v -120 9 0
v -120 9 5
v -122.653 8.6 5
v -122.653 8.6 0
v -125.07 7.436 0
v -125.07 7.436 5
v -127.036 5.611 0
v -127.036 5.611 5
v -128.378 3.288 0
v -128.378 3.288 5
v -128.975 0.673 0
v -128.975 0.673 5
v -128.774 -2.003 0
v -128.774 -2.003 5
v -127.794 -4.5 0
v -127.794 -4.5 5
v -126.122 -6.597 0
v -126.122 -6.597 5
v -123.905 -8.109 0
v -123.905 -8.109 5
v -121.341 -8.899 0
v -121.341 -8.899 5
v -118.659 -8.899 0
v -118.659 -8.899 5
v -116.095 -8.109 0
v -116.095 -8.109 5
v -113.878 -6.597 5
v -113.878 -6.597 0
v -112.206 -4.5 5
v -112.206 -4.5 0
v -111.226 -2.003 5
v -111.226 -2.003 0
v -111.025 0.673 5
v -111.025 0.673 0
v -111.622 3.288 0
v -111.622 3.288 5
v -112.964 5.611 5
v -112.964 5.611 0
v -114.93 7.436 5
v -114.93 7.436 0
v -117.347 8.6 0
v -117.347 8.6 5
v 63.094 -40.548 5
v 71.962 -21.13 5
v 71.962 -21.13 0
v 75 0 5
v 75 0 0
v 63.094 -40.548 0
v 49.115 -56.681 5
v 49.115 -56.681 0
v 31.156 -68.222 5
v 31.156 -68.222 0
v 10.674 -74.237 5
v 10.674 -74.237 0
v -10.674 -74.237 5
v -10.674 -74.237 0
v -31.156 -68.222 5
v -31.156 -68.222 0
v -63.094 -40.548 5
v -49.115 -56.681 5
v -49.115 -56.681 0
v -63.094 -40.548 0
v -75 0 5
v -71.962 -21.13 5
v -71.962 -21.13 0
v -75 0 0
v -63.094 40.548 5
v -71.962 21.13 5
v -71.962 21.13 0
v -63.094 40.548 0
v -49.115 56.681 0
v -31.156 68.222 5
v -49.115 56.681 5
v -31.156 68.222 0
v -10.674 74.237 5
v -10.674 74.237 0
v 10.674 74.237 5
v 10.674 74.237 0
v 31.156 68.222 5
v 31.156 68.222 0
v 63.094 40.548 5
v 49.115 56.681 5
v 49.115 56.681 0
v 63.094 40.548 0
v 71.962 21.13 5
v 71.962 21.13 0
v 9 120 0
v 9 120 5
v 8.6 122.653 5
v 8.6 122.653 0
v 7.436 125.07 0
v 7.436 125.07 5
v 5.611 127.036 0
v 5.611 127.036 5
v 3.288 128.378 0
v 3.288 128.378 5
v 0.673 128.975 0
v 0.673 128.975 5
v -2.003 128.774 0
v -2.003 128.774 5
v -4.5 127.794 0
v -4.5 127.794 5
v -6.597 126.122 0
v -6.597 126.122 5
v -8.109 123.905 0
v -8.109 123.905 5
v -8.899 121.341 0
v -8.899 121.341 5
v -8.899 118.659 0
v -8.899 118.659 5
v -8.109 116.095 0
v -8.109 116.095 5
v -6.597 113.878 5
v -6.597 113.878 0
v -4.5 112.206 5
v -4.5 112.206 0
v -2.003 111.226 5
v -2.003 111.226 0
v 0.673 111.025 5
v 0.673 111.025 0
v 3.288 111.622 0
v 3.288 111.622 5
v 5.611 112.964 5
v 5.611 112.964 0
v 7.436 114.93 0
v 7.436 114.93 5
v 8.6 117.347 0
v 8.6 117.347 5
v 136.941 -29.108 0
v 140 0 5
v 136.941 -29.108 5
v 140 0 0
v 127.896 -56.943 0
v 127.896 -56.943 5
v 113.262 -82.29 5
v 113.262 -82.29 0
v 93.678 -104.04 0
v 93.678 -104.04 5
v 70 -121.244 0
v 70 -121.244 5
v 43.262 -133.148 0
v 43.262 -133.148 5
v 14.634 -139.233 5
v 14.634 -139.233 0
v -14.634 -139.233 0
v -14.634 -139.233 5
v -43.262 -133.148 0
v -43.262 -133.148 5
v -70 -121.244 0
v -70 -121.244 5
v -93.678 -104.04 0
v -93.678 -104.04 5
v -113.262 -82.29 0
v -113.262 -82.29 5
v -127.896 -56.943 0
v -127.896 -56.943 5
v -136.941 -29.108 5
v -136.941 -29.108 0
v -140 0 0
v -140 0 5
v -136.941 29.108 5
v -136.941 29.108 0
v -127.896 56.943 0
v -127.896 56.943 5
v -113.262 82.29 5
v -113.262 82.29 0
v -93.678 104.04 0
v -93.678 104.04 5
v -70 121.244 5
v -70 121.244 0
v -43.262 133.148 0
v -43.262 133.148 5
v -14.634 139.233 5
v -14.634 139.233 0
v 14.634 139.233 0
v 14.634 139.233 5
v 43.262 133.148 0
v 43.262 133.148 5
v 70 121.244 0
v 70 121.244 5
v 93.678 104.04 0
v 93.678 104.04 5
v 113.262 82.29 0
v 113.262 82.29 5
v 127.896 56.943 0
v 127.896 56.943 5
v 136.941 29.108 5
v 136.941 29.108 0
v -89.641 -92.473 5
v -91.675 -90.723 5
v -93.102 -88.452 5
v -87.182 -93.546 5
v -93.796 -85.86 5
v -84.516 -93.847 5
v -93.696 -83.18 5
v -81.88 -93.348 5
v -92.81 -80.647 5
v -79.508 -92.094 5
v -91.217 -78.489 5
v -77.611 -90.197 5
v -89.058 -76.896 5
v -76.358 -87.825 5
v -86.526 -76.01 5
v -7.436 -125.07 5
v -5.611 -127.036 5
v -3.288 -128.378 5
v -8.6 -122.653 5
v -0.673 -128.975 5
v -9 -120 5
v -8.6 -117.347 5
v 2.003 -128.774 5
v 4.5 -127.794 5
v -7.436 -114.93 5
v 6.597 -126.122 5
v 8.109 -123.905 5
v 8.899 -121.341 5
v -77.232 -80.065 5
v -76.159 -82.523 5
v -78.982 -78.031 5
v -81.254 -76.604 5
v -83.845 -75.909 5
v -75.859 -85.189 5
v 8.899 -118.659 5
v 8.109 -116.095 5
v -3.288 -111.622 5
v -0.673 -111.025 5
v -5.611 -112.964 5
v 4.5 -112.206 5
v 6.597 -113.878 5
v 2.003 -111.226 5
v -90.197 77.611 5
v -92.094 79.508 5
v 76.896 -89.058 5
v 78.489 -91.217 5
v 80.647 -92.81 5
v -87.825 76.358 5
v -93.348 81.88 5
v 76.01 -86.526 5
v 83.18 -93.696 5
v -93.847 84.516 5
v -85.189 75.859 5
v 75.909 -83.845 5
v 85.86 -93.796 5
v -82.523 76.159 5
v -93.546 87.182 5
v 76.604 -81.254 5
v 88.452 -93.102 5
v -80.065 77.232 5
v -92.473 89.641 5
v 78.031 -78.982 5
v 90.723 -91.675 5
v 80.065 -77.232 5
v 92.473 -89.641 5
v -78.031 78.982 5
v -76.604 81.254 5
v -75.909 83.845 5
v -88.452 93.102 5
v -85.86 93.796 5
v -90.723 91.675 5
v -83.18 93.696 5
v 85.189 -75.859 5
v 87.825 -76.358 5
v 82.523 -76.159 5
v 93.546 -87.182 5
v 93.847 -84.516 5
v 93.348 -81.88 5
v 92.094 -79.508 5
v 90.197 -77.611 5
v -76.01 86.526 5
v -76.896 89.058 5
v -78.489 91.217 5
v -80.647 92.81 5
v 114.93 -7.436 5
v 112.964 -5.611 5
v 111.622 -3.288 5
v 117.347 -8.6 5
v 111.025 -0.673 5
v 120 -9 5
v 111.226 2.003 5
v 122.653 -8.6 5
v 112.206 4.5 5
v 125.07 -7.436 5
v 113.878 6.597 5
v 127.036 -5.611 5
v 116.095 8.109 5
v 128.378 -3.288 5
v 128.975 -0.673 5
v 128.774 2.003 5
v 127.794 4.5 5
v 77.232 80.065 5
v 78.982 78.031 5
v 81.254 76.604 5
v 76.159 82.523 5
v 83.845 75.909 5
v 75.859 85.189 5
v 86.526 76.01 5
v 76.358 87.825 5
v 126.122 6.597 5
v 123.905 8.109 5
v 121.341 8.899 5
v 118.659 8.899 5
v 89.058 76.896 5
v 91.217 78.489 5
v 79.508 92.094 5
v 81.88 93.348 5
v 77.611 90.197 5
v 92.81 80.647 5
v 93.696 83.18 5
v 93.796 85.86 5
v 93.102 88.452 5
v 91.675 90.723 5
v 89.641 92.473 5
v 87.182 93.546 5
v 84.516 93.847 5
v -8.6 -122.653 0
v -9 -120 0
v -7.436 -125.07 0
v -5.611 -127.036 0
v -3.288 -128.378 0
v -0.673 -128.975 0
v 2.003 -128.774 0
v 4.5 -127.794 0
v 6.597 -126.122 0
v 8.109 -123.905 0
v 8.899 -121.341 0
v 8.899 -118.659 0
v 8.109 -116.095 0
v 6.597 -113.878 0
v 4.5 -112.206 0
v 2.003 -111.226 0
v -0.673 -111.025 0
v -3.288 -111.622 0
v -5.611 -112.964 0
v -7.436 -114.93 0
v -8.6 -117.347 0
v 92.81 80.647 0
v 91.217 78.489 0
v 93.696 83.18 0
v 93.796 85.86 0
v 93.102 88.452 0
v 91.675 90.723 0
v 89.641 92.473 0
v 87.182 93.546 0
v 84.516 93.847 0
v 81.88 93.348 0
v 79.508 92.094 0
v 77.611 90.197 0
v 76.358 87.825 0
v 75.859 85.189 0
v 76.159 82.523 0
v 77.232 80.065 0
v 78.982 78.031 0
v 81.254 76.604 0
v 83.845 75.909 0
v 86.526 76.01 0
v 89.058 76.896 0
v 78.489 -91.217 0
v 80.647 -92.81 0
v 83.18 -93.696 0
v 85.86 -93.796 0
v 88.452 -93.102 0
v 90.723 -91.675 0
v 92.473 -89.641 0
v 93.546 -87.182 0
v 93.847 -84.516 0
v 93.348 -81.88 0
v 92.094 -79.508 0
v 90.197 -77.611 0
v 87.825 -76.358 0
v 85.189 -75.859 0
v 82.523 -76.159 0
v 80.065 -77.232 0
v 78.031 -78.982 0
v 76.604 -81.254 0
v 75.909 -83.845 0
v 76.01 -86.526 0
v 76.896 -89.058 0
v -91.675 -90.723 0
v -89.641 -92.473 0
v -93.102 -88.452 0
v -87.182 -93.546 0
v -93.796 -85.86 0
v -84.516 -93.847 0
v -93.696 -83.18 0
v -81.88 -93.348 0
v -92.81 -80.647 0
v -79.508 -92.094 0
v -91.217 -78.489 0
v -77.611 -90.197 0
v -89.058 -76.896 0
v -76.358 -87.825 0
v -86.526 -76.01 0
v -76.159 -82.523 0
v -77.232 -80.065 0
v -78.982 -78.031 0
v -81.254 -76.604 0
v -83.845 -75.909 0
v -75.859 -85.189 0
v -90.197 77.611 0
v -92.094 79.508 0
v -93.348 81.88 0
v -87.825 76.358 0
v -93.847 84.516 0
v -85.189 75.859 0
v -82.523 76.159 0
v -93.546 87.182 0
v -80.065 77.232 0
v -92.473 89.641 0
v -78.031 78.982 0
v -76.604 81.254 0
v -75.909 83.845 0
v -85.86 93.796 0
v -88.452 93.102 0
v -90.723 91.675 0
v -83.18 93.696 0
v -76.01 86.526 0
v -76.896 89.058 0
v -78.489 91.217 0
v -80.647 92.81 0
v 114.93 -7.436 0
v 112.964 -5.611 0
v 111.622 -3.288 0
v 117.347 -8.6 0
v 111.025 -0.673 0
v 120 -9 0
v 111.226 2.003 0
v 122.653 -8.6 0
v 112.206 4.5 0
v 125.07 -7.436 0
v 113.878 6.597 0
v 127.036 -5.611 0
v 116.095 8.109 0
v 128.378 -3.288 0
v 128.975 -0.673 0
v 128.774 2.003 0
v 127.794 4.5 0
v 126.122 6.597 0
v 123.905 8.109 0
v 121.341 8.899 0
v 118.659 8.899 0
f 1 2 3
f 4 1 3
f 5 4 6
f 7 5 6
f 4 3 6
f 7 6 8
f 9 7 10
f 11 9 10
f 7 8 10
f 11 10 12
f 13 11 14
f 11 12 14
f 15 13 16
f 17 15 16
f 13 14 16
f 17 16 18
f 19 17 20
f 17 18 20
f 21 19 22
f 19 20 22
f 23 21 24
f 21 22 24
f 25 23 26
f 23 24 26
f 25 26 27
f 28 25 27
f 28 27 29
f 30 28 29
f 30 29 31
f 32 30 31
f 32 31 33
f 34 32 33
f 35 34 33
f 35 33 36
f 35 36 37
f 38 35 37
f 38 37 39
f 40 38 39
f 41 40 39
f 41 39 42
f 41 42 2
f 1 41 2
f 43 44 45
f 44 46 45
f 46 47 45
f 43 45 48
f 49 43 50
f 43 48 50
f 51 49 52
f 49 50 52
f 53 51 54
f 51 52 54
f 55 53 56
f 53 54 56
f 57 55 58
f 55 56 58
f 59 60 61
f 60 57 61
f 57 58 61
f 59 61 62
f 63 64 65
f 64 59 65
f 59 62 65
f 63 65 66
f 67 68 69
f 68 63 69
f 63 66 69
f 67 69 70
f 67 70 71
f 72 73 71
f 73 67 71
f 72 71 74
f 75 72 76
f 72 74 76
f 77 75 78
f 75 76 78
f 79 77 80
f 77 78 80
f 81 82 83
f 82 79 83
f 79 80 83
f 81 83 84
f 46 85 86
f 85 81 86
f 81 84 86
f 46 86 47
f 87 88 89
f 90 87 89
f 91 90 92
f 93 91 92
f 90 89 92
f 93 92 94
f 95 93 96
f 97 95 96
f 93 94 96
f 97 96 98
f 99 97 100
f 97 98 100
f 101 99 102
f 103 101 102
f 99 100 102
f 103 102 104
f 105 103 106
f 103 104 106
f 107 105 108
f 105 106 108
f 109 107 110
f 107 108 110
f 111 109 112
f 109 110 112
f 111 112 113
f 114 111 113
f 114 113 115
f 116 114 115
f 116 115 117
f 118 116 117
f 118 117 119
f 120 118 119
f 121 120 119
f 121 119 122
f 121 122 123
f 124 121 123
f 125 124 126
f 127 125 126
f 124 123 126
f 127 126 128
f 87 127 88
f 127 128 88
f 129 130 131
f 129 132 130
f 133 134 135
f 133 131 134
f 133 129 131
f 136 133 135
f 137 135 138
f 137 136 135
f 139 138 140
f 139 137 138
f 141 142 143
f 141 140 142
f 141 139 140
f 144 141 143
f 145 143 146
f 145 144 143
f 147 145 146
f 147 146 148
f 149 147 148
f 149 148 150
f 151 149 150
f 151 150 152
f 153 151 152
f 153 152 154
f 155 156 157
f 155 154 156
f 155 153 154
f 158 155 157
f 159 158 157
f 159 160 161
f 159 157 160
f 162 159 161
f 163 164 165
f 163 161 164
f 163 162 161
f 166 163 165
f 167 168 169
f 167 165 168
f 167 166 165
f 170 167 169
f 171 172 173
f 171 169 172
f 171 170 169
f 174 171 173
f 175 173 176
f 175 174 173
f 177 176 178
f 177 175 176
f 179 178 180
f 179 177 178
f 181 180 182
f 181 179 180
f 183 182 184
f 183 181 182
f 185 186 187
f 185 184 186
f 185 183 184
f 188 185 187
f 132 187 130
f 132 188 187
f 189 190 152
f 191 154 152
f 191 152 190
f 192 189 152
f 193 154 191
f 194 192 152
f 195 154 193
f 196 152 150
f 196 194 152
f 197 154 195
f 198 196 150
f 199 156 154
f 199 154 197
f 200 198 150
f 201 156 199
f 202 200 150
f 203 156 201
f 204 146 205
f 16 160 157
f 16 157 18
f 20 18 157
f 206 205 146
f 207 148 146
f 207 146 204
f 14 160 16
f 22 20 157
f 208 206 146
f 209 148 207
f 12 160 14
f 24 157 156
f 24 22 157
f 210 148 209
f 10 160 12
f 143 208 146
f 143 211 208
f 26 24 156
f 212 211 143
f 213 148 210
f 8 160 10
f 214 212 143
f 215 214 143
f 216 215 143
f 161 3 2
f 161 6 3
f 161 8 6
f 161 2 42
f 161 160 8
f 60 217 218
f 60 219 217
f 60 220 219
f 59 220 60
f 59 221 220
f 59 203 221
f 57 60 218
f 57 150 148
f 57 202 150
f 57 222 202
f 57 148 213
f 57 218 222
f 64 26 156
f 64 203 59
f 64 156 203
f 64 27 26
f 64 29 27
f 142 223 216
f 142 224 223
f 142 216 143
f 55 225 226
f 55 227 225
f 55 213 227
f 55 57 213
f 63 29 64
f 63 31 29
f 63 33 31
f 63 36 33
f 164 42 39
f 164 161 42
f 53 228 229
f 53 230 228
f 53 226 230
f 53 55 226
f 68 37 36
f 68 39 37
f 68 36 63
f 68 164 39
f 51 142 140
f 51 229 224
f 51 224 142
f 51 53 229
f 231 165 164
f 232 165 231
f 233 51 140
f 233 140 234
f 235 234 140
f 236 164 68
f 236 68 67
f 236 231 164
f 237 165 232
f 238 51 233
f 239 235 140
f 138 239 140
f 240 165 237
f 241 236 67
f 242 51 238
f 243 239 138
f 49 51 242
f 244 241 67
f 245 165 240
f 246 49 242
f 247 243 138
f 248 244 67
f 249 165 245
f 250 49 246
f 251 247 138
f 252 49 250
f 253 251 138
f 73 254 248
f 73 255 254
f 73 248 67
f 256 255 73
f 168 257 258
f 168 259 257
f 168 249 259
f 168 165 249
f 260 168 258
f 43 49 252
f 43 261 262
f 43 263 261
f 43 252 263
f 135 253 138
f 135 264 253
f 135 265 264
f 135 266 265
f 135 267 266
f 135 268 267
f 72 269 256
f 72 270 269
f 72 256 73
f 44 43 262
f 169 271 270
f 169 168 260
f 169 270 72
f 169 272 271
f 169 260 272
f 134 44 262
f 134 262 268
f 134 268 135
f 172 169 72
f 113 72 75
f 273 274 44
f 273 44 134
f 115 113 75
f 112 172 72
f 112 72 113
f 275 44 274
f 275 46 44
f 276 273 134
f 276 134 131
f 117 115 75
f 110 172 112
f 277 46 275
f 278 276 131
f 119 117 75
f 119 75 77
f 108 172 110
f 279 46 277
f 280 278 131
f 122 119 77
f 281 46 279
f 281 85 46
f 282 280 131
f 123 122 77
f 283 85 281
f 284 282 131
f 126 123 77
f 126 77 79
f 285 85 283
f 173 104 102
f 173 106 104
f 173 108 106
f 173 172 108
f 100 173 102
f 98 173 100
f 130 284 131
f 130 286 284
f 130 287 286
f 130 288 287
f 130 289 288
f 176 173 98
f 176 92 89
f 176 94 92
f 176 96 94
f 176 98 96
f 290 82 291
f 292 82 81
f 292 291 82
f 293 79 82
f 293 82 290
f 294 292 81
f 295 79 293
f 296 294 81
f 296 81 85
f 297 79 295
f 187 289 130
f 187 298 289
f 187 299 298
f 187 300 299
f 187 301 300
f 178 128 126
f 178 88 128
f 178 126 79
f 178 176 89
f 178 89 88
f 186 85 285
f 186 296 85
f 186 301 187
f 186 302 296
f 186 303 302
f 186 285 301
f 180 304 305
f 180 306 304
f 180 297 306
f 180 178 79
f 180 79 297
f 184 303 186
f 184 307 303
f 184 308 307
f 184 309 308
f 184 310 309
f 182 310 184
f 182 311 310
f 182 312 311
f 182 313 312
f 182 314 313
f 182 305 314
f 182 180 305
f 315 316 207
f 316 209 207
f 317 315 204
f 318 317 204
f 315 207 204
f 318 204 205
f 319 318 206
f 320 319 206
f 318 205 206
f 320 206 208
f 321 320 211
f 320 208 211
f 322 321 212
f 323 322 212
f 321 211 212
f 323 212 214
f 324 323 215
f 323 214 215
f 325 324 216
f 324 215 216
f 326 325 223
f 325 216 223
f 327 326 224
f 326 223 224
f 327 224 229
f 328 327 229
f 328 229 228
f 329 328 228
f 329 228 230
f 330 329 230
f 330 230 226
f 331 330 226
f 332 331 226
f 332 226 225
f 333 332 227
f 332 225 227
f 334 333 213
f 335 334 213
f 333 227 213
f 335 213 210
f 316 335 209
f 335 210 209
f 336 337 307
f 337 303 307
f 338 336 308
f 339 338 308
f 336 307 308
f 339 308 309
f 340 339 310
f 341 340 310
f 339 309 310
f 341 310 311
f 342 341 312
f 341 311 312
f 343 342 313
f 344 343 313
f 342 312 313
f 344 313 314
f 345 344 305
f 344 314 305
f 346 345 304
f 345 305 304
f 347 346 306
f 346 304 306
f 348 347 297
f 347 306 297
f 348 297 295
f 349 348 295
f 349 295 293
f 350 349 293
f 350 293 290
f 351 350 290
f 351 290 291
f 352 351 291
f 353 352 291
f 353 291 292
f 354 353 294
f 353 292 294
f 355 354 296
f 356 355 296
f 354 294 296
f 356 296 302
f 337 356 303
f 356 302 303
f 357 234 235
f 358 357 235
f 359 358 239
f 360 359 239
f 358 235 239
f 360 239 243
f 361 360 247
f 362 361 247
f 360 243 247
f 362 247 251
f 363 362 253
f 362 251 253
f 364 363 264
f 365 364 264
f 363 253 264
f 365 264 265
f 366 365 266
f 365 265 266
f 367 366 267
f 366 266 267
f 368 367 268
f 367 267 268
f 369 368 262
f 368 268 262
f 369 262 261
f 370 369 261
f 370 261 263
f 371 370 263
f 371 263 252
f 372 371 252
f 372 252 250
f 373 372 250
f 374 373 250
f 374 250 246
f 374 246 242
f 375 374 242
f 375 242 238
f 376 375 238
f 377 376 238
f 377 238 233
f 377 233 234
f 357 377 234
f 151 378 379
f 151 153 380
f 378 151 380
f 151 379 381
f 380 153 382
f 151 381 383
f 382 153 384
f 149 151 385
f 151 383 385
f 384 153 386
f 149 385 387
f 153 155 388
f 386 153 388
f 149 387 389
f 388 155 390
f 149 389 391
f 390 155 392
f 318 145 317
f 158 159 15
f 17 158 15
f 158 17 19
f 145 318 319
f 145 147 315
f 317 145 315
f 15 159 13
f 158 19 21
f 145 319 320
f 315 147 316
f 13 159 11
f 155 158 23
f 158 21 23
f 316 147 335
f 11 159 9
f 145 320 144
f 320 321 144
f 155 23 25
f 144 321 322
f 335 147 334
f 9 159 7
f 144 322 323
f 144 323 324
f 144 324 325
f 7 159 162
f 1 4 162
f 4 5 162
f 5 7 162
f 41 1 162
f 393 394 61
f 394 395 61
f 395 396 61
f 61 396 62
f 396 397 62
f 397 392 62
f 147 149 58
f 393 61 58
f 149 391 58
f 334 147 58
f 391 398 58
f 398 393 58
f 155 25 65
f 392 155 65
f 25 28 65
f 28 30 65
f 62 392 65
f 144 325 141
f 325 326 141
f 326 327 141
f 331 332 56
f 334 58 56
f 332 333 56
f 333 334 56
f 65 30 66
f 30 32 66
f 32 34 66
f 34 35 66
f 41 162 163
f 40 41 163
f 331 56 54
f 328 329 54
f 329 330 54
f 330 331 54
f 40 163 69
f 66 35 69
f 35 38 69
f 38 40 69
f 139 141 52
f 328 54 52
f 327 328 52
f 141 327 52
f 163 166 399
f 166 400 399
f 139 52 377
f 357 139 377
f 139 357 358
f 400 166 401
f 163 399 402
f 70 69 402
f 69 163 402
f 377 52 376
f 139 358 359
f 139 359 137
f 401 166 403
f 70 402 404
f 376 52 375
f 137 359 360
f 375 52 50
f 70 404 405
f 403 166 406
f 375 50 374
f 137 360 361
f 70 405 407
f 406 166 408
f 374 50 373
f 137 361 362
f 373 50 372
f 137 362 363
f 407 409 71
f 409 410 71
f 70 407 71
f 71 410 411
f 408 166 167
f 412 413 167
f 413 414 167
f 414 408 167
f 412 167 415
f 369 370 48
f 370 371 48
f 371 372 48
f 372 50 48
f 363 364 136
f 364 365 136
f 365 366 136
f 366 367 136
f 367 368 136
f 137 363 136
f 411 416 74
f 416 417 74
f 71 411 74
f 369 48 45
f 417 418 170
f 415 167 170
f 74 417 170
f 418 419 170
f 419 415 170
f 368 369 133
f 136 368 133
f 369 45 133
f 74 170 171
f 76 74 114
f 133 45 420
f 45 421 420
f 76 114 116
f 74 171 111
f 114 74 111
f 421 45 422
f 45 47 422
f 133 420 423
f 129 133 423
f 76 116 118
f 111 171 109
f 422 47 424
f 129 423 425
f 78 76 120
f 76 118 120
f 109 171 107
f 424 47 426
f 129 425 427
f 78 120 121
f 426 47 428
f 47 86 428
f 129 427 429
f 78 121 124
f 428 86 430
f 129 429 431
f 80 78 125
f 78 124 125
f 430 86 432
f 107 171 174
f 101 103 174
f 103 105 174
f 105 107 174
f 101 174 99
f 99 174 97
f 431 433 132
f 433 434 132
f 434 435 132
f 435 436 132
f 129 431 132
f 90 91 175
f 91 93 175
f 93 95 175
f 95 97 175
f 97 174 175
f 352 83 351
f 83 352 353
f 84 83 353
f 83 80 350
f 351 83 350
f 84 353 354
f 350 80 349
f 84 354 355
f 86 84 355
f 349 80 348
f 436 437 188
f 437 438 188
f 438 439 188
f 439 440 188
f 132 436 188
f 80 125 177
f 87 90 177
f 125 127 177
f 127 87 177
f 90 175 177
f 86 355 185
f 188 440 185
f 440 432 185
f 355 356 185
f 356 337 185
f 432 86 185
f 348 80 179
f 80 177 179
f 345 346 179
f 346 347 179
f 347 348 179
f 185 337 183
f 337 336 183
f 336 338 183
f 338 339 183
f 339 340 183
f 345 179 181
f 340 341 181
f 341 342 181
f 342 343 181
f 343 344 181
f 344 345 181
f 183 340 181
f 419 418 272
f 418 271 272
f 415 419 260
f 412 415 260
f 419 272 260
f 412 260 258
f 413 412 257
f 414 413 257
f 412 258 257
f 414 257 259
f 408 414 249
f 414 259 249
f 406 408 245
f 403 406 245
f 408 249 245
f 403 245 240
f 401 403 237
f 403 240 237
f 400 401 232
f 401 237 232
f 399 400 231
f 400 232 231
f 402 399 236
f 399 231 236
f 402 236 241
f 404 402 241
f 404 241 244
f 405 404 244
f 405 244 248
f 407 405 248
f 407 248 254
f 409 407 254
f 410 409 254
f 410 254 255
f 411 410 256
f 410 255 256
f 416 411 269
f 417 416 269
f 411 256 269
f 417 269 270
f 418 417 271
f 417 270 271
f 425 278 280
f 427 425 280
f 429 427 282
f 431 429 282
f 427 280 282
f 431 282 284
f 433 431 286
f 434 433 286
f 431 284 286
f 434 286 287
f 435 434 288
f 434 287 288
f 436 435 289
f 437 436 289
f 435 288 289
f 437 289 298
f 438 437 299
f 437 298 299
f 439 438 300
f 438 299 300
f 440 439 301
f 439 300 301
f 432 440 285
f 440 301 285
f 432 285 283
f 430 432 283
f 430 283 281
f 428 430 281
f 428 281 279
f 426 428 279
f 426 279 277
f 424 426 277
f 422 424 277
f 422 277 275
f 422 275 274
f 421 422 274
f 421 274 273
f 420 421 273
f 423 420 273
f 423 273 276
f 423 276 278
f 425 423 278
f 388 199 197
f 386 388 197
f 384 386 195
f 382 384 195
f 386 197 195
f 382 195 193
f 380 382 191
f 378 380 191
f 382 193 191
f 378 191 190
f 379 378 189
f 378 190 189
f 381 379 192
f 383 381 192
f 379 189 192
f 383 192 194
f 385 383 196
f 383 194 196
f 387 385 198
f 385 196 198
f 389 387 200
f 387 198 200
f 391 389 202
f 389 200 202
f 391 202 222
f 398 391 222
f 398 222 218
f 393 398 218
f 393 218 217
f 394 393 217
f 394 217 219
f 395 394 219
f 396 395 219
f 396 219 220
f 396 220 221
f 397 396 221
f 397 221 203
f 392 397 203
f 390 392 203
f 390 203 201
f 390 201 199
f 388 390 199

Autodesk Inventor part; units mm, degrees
ref_plane "YZ Plane" through (0, 0, 0) normal (1, 0, 0) x (0, 1, 0)
ref_plane "XZ Plane" through (0, 0, 0) normal (0, 1, 0) x (-1, 0, 0)
ref_plane "XY Plane" through (0, 0, 0) normal (0, 0, 1) x (1, 0, 0)
sketch "Sketch1" plane through (0, 0, 0) normal (0, 0, 1) x (1, 0, 0)
  circle A0 centre (0, 0) radius 75
  circle A1 centre (0, 0) radius 140
  dimension "d22" = 150
  dimension "d23" = 280
extrude "Plate1" add sketch "Sketch1" along normal blind 5
sketch "Sketch5" plane through (0, 0, 5) normal (0, 0, 1) x (1, 0, 0)
  circle A0 centre (0, 120) radius 9
  circle A1 centre (0, 0) radius 120 construction
  dimension "d25" = 240
  dimension "d24" = 18
extrude "Cut1" cut sketch "Sketch5" against normal blind 5
pattern_circular "Circular Pattern1" count 8 over 360 about axis through (0, 0, 0) along (0, 0, 1) of "Cut1"
equation "\"d26\" = Thickness"
equation "\"d2\" = Thickness"
equation "\"BendReliefWidth\" = Thickness"
equation "\"BendReliefDepth\" = 0.5 * Thickness"
equation "\"TransitionRadius\" = BendRadius"
equation "\"JacobiRadiusSize\" = BendRadius"
equation "\"GapSize\" = Thickness"
equation "\"Thickness\" = 5"
equation "\"BendRadius\" = 5"
properties part number "drain flange" material "Stainless Steel"
